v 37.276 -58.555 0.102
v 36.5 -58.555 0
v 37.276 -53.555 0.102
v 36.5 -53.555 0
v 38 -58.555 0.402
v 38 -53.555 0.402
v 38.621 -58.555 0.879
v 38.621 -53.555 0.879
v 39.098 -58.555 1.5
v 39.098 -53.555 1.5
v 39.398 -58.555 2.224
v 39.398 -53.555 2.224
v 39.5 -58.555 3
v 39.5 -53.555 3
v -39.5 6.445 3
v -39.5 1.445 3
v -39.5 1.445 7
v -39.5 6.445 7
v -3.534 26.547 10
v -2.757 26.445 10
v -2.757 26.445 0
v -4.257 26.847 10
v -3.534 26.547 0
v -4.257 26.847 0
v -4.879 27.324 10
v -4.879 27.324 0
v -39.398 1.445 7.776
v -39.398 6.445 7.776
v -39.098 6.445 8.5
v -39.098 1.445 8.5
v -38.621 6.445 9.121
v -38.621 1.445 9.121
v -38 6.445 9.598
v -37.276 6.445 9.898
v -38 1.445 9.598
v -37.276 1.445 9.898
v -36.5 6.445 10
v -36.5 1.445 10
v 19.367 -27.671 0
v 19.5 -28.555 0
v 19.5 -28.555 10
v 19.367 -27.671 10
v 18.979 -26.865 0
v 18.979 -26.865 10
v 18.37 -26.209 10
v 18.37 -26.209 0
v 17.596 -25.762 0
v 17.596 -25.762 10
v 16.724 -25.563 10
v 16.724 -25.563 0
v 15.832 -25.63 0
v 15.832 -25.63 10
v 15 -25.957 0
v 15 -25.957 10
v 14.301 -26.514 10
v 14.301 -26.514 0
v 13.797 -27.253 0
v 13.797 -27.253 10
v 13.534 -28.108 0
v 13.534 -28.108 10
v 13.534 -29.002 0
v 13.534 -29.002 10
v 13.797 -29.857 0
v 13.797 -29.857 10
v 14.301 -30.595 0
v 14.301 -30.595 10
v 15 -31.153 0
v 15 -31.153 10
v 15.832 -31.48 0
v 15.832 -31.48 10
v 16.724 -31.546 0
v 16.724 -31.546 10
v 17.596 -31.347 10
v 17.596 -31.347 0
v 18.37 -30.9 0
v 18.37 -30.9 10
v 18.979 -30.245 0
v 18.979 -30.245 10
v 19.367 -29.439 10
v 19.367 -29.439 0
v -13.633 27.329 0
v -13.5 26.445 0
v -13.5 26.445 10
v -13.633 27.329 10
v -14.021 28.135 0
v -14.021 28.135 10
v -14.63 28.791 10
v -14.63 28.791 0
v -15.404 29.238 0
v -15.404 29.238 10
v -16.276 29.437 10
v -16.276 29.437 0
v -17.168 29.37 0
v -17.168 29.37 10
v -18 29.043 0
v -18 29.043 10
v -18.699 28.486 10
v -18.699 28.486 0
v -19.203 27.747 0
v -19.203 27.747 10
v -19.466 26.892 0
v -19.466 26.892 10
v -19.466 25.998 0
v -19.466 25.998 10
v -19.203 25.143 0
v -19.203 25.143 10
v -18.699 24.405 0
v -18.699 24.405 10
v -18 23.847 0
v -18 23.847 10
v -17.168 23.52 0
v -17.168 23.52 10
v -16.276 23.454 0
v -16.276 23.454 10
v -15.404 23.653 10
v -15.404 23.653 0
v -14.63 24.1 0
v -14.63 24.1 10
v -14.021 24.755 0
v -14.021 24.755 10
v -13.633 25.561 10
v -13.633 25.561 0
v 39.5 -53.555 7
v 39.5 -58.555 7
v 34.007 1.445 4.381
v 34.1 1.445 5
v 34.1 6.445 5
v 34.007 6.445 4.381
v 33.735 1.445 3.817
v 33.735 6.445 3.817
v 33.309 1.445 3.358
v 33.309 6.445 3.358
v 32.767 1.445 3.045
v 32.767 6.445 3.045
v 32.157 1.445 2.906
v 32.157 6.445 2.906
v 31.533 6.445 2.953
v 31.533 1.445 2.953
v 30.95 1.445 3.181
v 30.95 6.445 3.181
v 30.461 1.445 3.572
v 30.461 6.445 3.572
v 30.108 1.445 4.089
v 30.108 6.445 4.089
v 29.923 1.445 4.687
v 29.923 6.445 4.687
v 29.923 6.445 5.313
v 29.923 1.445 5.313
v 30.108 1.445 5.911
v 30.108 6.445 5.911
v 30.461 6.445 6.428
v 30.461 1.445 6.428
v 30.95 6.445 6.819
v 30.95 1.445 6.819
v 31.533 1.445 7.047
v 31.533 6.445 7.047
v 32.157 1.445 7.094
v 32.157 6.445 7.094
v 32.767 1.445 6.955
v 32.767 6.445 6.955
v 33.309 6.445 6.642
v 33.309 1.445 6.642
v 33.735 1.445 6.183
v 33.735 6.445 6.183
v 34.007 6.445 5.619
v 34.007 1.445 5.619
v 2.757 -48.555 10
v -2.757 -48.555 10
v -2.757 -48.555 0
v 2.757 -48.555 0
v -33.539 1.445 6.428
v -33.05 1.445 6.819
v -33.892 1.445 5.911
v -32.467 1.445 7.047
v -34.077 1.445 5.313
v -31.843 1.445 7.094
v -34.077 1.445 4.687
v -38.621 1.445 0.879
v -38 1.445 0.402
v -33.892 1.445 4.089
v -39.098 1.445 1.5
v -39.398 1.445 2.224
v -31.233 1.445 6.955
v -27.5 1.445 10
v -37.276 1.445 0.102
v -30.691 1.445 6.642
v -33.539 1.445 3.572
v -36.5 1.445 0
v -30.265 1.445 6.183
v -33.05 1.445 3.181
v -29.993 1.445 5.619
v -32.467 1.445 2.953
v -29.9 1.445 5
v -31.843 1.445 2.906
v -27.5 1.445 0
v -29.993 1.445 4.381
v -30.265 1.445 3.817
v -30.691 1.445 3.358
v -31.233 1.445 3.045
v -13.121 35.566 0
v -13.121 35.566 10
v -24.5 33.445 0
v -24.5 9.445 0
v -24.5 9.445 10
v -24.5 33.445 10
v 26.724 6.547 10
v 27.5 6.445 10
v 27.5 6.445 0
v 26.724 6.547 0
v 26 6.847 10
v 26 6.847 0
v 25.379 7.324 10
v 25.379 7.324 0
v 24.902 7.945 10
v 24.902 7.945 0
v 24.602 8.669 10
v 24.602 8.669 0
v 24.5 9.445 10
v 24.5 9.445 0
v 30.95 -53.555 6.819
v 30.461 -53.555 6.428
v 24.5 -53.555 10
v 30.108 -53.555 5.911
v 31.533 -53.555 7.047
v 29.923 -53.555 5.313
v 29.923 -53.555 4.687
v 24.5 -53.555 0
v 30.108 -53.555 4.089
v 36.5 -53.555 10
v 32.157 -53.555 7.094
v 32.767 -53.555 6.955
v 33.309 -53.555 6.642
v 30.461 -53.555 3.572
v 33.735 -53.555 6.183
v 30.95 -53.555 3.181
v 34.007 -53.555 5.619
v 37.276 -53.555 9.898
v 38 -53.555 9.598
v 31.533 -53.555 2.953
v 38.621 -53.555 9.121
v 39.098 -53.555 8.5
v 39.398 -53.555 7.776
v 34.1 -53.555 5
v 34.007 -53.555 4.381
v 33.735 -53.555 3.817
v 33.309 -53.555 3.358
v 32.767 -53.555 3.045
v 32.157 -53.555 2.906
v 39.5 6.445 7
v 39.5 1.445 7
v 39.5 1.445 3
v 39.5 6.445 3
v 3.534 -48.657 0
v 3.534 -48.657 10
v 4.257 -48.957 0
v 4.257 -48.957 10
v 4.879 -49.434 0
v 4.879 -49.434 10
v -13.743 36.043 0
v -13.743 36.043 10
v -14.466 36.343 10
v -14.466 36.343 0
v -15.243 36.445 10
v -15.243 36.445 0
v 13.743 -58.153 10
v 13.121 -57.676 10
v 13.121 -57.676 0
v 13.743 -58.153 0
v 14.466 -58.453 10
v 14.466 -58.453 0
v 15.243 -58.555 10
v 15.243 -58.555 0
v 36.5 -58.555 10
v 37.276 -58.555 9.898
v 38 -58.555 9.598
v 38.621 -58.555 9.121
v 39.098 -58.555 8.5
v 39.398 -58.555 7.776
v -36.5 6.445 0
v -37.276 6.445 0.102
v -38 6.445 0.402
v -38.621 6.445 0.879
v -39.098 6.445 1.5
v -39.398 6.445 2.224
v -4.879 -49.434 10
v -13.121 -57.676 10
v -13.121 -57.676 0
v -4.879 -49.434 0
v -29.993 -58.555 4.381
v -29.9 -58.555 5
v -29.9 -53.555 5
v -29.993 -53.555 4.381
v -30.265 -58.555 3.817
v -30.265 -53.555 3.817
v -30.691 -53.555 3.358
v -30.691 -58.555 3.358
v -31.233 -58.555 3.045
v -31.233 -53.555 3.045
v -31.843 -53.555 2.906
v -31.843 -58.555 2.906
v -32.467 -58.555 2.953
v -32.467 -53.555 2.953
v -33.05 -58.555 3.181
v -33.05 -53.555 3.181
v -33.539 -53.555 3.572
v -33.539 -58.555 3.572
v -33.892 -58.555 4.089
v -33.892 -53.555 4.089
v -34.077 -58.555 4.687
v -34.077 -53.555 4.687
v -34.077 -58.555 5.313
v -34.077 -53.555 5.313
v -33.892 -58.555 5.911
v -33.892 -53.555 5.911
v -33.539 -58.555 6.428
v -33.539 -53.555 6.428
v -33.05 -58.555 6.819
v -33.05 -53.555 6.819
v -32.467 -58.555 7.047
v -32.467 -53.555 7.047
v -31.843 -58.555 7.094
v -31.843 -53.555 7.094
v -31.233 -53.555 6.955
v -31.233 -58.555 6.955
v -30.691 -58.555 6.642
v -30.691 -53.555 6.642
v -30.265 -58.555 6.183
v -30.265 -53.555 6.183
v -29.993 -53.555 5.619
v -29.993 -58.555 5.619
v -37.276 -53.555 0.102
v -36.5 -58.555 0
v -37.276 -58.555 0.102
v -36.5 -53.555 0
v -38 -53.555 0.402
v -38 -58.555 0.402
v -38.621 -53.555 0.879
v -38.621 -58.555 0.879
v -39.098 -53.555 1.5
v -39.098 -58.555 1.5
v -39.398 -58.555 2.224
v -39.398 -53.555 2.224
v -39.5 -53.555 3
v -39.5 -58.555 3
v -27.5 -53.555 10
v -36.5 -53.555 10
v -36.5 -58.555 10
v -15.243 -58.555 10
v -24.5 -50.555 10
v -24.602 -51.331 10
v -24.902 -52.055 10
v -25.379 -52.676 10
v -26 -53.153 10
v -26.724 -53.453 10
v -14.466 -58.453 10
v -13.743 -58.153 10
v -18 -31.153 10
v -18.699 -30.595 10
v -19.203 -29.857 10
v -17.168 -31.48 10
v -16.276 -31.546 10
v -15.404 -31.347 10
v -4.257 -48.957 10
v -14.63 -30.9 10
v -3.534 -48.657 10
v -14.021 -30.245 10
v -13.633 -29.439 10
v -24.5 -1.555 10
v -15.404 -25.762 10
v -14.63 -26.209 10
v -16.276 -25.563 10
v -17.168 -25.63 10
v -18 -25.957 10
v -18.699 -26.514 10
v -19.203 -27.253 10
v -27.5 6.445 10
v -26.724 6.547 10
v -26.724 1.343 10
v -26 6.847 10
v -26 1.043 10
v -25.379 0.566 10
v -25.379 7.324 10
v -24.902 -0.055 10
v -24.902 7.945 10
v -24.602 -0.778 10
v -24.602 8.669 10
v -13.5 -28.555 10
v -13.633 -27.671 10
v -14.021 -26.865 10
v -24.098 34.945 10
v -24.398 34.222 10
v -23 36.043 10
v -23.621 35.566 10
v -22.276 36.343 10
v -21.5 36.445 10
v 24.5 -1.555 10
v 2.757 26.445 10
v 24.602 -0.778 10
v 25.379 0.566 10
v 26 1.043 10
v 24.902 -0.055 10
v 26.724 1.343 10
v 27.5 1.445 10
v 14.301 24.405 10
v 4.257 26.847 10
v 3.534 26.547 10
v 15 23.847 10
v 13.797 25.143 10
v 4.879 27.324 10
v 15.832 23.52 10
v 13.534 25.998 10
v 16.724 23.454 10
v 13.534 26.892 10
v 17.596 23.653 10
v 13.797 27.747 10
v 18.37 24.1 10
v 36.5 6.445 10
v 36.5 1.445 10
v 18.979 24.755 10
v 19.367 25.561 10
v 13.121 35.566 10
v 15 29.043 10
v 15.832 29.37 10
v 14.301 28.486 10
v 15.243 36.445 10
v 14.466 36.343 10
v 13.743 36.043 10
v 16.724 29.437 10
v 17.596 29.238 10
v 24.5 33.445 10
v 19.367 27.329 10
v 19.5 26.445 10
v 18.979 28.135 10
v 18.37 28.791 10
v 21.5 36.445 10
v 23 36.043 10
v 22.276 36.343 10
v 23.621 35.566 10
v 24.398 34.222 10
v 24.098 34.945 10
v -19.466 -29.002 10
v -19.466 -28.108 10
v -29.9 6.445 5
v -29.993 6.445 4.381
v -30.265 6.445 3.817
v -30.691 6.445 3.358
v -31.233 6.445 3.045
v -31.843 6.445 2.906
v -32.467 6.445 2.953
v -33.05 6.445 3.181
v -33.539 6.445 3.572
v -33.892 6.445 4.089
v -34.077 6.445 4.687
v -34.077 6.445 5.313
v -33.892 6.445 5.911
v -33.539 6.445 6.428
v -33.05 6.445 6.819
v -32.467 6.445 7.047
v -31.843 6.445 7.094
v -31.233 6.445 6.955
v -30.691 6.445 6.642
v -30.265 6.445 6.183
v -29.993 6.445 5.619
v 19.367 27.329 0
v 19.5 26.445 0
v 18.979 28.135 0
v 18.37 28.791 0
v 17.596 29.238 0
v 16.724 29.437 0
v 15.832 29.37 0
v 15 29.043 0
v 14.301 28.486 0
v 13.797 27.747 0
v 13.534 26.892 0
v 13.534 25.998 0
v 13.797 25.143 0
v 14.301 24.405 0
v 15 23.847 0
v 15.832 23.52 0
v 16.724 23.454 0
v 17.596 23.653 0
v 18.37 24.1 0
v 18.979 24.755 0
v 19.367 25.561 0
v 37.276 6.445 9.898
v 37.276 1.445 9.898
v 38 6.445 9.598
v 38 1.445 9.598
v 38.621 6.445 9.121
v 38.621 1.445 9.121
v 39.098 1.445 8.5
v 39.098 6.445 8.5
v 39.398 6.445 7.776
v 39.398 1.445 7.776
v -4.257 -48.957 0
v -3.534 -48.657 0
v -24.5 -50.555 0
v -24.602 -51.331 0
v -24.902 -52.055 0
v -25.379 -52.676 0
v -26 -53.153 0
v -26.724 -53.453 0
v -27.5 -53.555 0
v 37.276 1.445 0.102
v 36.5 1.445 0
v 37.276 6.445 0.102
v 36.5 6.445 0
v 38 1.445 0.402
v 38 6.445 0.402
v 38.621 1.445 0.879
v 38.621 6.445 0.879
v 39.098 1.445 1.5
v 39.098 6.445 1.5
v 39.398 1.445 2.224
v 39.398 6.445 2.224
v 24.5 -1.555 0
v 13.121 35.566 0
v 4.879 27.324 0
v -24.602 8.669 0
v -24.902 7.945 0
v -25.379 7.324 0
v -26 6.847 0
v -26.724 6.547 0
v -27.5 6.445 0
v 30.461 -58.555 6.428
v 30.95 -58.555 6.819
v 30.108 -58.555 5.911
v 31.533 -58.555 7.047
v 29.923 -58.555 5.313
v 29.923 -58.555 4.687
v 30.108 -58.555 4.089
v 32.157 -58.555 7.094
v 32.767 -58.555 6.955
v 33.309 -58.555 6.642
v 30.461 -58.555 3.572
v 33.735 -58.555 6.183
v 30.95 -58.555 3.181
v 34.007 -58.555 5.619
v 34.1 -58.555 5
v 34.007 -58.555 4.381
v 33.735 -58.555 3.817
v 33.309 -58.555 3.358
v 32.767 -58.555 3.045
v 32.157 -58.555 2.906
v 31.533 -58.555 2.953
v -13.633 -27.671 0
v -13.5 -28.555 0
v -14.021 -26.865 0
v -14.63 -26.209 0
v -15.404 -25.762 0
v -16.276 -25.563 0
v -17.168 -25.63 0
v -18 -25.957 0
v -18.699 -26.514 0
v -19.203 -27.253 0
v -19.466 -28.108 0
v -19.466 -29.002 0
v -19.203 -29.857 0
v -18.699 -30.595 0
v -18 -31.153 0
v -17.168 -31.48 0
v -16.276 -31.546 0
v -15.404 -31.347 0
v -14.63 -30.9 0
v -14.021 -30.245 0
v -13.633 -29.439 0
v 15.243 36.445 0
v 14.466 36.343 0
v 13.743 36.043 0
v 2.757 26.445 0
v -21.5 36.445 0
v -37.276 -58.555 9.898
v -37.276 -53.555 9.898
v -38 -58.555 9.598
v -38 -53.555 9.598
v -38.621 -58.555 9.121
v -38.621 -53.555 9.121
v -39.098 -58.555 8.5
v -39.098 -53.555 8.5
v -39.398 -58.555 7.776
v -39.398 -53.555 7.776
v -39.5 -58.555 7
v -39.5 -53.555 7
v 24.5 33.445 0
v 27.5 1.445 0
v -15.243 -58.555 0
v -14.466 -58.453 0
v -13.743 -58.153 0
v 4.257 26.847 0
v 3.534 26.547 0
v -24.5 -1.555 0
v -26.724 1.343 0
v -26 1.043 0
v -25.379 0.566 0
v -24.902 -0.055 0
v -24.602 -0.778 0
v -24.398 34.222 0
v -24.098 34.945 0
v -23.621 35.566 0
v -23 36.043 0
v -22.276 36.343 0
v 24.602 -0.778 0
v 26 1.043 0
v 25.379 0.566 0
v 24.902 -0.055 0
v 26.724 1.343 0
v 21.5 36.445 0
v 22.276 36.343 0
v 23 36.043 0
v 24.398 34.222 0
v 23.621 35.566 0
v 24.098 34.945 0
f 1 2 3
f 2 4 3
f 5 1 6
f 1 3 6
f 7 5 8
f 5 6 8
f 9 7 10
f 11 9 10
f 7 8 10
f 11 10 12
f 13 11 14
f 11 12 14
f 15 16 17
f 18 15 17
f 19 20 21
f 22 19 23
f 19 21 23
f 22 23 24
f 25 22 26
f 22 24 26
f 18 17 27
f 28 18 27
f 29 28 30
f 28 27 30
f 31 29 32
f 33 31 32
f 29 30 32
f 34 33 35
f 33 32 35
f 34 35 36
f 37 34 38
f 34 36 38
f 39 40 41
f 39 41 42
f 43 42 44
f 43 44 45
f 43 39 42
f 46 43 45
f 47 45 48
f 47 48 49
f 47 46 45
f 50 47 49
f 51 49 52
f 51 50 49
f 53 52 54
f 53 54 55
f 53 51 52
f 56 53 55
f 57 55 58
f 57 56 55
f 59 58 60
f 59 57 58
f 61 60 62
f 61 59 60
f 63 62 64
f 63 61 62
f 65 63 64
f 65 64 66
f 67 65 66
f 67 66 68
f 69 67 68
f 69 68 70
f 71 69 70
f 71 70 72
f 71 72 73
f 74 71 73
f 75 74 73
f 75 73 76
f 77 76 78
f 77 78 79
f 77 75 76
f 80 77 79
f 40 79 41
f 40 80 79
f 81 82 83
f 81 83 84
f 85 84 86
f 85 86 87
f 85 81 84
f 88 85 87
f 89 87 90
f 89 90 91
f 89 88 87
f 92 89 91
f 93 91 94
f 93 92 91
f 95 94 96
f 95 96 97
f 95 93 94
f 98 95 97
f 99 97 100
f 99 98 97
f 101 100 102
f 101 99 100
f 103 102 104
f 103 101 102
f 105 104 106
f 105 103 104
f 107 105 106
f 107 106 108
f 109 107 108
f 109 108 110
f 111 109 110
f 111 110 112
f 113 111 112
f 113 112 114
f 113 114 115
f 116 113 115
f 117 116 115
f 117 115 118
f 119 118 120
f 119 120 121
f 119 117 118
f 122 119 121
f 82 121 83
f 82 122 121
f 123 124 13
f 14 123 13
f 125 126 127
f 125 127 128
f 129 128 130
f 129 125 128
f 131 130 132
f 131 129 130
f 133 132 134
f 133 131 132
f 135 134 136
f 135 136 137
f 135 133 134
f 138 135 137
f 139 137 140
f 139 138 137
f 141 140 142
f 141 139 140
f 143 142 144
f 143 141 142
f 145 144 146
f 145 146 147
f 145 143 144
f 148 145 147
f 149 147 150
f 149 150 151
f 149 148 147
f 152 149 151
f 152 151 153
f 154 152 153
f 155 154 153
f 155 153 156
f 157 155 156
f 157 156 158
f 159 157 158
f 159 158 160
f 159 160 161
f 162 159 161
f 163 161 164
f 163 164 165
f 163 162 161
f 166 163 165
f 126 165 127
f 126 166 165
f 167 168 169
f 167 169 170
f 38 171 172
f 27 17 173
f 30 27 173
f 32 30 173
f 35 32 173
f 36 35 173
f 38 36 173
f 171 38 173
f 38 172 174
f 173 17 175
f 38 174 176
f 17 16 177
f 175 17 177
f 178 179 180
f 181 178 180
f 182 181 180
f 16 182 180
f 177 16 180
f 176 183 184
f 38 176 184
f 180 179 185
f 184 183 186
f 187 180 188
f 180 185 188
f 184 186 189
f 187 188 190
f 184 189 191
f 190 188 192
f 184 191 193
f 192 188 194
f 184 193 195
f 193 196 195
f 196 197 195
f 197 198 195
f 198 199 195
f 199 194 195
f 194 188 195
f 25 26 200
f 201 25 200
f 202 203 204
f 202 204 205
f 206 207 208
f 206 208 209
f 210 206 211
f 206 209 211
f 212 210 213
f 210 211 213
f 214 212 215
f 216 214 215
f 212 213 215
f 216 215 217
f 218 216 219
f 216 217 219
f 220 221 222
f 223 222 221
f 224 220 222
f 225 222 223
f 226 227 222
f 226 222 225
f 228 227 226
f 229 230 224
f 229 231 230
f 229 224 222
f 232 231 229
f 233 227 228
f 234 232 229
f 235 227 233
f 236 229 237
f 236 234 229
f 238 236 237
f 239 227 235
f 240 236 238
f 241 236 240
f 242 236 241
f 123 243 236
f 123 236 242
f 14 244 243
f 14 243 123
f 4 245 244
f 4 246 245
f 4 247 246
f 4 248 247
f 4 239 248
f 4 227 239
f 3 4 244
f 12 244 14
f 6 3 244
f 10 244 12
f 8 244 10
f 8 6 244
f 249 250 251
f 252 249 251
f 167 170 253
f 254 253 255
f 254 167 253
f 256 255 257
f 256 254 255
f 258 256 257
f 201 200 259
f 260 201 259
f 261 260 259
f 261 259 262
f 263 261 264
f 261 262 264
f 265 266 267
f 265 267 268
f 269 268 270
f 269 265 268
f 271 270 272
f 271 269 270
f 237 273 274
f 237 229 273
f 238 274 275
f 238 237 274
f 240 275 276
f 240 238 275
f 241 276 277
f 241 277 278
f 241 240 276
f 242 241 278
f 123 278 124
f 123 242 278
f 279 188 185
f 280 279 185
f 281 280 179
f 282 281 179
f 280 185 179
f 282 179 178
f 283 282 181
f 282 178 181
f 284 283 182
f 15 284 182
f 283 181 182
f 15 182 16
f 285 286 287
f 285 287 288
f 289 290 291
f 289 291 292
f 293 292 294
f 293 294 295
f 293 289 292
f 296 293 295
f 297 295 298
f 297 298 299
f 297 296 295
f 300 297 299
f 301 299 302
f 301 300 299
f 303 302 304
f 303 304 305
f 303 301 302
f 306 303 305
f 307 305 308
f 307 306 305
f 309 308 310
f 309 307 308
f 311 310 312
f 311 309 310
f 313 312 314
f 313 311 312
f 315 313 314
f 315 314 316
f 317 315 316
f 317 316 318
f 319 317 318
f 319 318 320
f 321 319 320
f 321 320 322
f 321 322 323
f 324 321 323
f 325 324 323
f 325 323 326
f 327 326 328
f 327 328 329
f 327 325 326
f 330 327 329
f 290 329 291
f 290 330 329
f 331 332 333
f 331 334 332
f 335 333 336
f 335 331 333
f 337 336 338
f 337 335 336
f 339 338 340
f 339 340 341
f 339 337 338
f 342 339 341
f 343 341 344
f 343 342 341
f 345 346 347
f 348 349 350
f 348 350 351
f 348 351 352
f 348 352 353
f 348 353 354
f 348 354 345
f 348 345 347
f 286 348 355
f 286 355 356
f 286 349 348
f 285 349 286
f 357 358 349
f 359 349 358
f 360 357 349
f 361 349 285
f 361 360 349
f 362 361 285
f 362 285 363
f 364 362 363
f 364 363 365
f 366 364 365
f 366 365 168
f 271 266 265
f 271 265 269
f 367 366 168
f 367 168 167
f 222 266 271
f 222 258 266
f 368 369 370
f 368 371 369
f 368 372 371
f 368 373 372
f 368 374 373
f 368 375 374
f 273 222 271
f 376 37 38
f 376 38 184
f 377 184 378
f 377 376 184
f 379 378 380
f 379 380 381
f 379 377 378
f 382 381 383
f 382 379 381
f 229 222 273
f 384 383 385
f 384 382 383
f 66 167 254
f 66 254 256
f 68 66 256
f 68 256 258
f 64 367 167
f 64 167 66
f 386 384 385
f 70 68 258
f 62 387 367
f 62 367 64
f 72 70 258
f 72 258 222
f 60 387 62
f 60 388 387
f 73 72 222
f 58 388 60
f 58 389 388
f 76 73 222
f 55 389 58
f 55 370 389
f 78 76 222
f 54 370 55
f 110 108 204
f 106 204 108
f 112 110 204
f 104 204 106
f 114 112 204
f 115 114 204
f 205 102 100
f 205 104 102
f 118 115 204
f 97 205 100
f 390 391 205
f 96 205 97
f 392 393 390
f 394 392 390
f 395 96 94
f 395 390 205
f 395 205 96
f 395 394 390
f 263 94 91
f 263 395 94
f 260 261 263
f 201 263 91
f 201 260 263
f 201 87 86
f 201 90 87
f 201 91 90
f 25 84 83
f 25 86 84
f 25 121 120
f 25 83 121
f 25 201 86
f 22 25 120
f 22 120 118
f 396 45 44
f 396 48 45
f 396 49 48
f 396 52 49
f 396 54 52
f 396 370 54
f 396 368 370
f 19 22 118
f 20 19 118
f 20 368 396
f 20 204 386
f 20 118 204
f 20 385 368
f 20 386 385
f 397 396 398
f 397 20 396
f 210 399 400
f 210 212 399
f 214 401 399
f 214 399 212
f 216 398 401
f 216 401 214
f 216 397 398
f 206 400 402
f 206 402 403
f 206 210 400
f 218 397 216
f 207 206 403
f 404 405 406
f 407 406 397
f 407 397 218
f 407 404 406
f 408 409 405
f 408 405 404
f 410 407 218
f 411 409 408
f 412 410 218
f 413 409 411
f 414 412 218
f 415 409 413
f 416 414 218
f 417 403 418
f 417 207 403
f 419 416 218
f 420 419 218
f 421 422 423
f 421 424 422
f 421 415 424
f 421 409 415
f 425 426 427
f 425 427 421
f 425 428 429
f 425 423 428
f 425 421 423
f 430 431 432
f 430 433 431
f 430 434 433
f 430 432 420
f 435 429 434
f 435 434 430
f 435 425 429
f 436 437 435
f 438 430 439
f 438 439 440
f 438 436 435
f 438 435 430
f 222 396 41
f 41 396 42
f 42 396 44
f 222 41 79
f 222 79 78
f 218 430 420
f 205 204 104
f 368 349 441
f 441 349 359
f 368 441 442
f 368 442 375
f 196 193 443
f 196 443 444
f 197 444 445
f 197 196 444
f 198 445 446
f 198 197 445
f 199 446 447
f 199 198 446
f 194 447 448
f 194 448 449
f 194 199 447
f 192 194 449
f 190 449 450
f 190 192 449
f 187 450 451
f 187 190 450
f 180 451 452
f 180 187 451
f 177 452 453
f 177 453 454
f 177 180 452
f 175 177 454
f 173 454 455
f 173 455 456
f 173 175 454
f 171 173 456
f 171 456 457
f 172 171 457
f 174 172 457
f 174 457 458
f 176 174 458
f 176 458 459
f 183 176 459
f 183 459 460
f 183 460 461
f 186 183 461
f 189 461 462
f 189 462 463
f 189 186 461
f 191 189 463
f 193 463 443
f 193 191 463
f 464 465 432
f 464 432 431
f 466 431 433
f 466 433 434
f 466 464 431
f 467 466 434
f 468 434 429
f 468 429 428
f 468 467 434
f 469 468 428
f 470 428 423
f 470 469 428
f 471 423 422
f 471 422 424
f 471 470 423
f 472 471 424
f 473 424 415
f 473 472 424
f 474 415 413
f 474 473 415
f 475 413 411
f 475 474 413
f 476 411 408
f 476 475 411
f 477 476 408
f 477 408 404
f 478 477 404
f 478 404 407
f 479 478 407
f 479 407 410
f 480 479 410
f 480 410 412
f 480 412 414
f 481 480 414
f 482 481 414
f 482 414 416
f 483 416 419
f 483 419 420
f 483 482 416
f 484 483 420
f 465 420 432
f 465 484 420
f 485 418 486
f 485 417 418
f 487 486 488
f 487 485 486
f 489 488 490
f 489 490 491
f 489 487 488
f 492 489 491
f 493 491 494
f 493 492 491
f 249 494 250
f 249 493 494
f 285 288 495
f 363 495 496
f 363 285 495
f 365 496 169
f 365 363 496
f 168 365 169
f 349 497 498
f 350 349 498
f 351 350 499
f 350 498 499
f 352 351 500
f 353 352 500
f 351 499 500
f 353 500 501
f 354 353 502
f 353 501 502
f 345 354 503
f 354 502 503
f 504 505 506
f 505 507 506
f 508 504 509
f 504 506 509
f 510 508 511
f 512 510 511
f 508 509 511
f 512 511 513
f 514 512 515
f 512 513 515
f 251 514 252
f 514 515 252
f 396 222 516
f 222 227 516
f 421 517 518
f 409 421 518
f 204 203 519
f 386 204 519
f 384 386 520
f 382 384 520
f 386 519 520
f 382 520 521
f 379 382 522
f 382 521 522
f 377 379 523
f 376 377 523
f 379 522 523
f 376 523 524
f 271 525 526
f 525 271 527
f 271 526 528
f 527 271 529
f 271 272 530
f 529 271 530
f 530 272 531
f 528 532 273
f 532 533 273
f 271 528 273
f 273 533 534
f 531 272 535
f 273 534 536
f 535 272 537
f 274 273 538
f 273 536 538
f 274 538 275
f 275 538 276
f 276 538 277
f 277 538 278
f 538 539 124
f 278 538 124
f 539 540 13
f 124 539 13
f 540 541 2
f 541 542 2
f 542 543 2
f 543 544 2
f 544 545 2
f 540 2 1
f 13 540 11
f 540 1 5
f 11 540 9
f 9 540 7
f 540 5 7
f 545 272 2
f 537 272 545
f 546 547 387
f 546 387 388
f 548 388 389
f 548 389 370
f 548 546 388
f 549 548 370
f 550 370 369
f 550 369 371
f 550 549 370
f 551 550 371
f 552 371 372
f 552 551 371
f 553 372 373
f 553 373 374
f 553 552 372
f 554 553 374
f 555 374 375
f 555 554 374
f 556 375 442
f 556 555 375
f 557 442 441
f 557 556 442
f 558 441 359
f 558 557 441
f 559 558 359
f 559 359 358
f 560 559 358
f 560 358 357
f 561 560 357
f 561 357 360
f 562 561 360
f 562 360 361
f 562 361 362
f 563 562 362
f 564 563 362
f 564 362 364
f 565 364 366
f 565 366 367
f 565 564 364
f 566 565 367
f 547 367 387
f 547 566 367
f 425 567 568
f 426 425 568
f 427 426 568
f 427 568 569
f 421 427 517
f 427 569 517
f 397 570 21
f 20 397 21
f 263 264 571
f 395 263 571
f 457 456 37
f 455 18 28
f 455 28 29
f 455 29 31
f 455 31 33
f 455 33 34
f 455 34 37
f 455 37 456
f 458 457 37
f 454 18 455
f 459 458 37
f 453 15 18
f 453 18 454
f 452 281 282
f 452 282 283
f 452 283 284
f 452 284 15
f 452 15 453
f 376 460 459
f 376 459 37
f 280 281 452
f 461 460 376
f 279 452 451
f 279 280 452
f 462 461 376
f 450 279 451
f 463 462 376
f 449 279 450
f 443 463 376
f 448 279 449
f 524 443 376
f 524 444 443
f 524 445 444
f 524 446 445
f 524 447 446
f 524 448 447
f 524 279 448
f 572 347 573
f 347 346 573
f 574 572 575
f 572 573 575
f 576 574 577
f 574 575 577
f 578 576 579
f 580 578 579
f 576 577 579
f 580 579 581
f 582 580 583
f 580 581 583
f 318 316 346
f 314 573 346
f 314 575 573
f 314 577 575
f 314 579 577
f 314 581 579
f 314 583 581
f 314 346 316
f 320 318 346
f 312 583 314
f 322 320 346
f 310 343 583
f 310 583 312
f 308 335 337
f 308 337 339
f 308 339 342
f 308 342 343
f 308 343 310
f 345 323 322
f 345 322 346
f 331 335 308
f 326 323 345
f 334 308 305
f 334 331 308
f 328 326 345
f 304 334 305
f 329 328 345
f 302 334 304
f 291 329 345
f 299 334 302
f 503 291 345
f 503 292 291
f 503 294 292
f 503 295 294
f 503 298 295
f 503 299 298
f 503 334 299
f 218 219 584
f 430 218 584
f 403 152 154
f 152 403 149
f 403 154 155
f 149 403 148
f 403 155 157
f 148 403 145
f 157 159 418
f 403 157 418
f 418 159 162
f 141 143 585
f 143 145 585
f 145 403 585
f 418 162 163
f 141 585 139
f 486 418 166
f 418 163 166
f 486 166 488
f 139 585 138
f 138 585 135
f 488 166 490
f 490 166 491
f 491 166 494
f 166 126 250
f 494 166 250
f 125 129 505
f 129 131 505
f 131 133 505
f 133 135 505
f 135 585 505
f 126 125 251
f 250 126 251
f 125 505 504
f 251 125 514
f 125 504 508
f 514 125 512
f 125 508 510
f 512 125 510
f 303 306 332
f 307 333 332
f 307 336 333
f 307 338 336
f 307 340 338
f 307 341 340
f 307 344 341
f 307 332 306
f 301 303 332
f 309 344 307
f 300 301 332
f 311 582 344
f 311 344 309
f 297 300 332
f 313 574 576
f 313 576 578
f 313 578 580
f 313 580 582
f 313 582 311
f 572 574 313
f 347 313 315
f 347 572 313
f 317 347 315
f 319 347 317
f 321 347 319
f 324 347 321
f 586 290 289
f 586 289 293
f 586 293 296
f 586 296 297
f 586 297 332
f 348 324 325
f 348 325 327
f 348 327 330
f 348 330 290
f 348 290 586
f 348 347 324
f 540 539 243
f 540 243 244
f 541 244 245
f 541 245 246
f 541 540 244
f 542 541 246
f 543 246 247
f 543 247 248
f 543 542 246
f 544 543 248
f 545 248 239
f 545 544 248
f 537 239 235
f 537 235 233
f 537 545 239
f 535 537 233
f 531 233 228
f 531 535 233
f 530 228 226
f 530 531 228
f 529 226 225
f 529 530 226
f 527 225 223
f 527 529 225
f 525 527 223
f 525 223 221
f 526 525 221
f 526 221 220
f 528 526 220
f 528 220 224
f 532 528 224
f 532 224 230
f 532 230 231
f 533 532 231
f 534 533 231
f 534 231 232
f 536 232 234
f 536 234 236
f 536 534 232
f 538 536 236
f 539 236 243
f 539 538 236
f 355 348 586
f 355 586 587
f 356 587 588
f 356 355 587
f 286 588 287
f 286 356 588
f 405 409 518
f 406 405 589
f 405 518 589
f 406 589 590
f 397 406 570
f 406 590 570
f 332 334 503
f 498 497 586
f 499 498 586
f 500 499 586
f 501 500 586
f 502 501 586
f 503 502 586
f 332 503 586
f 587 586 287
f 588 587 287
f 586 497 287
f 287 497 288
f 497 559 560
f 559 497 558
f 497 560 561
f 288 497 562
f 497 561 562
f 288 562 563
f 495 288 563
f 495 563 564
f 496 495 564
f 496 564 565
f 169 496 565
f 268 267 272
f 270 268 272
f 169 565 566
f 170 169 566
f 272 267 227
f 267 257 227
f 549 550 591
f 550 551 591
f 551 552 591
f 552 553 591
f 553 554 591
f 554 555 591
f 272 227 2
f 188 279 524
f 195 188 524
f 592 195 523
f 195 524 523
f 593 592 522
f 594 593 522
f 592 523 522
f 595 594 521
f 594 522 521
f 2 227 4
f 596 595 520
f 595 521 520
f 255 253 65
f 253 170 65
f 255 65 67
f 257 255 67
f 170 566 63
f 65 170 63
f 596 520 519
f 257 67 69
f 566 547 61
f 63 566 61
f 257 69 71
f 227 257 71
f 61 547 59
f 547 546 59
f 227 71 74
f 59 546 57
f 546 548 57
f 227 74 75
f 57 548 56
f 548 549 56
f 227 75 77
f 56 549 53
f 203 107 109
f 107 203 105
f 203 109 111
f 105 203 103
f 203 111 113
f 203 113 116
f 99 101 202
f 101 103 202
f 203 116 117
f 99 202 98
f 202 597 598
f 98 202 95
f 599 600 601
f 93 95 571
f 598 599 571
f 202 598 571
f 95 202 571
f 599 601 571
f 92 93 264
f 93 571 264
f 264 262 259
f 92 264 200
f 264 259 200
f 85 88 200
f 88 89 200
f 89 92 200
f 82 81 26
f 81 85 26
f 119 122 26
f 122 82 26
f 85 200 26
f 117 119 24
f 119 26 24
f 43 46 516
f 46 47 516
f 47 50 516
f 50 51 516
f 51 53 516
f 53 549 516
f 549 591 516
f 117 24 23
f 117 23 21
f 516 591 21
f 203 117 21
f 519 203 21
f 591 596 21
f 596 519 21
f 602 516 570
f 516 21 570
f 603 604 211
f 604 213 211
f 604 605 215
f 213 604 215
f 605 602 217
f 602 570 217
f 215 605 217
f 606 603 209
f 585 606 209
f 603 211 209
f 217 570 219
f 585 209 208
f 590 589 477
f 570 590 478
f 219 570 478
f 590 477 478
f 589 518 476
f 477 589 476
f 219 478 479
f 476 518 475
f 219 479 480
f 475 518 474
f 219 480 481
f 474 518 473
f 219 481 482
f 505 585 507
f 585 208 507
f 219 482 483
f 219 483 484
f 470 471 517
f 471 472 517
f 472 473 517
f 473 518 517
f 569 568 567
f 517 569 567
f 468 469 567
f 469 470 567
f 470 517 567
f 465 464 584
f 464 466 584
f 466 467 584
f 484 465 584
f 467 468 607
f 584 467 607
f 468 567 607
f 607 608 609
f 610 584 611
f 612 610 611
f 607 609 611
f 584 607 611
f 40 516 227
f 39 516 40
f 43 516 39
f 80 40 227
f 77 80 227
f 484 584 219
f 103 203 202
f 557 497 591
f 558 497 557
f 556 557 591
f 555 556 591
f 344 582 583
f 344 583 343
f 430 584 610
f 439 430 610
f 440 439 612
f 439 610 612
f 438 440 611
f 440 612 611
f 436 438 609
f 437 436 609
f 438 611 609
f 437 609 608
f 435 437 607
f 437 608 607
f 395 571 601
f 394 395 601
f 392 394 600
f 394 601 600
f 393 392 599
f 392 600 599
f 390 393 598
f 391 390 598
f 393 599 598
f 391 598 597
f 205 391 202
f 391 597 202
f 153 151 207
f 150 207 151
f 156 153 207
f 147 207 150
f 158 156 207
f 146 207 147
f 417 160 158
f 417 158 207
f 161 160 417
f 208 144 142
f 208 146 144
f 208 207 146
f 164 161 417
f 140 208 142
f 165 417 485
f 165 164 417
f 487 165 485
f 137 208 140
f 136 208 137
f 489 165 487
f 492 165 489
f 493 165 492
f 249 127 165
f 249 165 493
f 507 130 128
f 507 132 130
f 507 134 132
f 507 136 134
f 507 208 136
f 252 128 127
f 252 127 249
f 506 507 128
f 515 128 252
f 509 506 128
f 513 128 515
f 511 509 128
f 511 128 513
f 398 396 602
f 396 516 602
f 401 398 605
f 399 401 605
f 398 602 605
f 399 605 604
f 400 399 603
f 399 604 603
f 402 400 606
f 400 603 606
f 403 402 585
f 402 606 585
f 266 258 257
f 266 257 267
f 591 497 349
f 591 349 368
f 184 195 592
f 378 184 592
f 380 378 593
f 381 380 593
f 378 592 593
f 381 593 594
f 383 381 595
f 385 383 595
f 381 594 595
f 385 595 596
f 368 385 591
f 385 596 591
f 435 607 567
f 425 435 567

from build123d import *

# Parameters (mm, degrees)
SKETCH1_R           = 3
BOSS_EXTRUDE1_DEPTH = 10
SKETCH2_W           = 10
SKETCH2_H           = 5
BOSS_EXTRUDE2_DEPTH = 15
SKETCH3_R           = 2.1
CUT_EXTRUDE1_DEPTH  = 64
FILLET1_R           = 3
BOSS_EXTRUDE3_START = -10
BOSS_EXTRUDE3_DEPTH = 10
MIRROR3_START       = -58.554872108
MIRROR3_OUTLINE_W   = 15
MIRROR3_OUTLINE_H   = 10
MIRROR3_OUTLINE_R   = 2.1
MIRROR3_DEPTH       = 5
MIRROR3_2_DEPTH     = 10
FILLET2_R           = 3
SKETCH5_W           = 15
SKETCH5_H           = 11
CUT_EXTRUDE2_DEPTH  = 80.749736613
FILLET3_R           = 3
MIRROR4_START       = 1.445127892
MIRROR4_OUTLINE_R   = 2.1
MIRROR4_DEPTH       = 5
MIRROR4_2_DEPTH     = 10
FILLET4_R           = 3
SKETCH6_W           = 15
SKETCH6_H           = 11
CUT_EXTRUDE3_DEPTH  = 80.749736613
CUT_EXTRUDE4_DEPTH  = 80.749736613


with BuildPart() as part:
    # Sketch1 → Boss-Extrude1 (new body)
    with BuildSketch(Plane.XY):
        with BuildLine():
            Line((-24.5, 33.445127892), (-24.5, -35.554872108))
            ThreePointArc((-24.5, -35.554872108), (-23.621320344, -37.676192452), (-21.5, -38.554872108))
            Line((-21.5, -38.554872108), (-15.242640687, -38.554872108))
            ThreePointArc((-15.242640687, -38.554872108), (-14.09459039, -38.326510706), (-13.121320344, -37.676192452))
            Line((-13.121320344, -37.676192452), (-4.878679656, -29.433551765))
            ThreePointArc((-4.878679656, -29.433551765), (-3.90540961, -28.783233511), (-2.757359313, -28.554872108))
            Line((-2.757359313, -28.554872108), (2.757359313, -28.554872108))
            ThreePointArc((2.757359313, -28.554872108), (3.90540961, -28.783233511), (4.878679656, -29.433551765))
            Line((4.878679656, -29.433551765), (13.121320344, -37.676192452))
            ThreePointArc((13.121320344, -37.676192452), (14.09459039, -38.326510706), (15.242640687, -38.554872108))
            Line((15.242640687, -38.554872108), (21.5, -38.554872108))
            ThreePointArc((21.5, -38.554872108), (23.621320344, -37.676192452), (24.5, -35.554872108))
            Line((24.5, -35.554872108), (24.5, 33.445127892))
            ThreePointArc((24.5, 33.445127892), (23.621320344, 35.566448235), (21.5, 36.445127892))
            Line((21.5, 36.445127892), (15.242640687, 36.445127892))
            ThreePointArc((15.242640687, 36.445127892), (14.09459039, 36.216766489), (13.121320344, 35.566448235))
            Line((13.121320344, 35.566448235), (4.878679656, 27.323807548))
            ThreePointArc((4.878679656, 27.323807548), (3.90540961, 26.673489294), (2.757359313, 26.445127892))
            Line((2.757359313, 26.445127892), (-2.757359313, 26.445127892))
            ThreePointArc((-2.757359313, 26.445127892), (-3.90540961, 26.673489294), (-4.878679656, 27.323807548))
            Line((-4.878679656, 27.323807548), (-13.121320344, 35.566448235))
            ThreePointArc((-13.121320344, 35.566448235), (-14.09459039, 36.216766489), (-15.242640687, 36.445127892))
            Line((-15.242640687, 36.445127892), (-21.5, 36.445127892))
            ThreePointArc((-21.5, 36.445127892), (-23.621320344, 35.566448235), (-24.5, 33.445127892))
        make_face()
        with Locations((16.5, -28.554872108)):
            Circle(SKETCH1_R, mode=Mode.SUBTRACT)
        with Locations((-16.5, -28.554872108)):
            Circle(SKETCH1_R, mode=Mode.SUBTRACT)
        with Locations((16.5, 26.445127892)):
            Circle(SKETCH1_R, mode=Mode.SUBTRACT)
        with Locations((-16.5, 26.445127892)):
            Circle(SKETCH1_R, mode=Mode.SUBTRACT)
    extrude(amount=BOSS_EXTRUDE1_DEPTH)

    # Sketch2 → Boss-Extrude2 (add)
    with BuildSketch(Plane(origin=(24.5, 0, 0), x_dir=(0, 0, -1), z_dir=(1, 0, 0))):
        with Locations((-5, 23.945127892)):
            Rectangle(SKETCH2_W, SKETCH2_H)
        with Locations((-5, -26.054872108)):
            Rectangle(SKETCH2_W, SKETCH2_H)
    boss_extrude2 = extrude(amount=BOSS_EXTRUDE2_DEPTH)

    # Sketch3 → Cut-Extrude1 (cut)
    with BuildSketch(Plane(origin=(0, 26.445127892, 0), x_dir=(1, 0, 0), z_dir=(0, 1, 0))):
        with Locations(Location((32, -5, 0), (0, 0, 180))):
            Circle(SKETCH3_R)
    cut_extrude1 = extrude(amount=-CUT_EXTRUDE1_DEPTH, mode=Mode.SUBTRACT)

    # Mirror1: Boss-Extrude2, Cut-Extrude1 across plane
    add(boss_extrude2.mirror(Plane(origin=(0, 0, 0), x_dir=(0, 0, 1), z_dir=(1, 0, 0))))
    add(cut_extrude1.mirror(Plane(origin=(0, 0, 0), x_dir=(0, 0, 1), z_dir=(1, 0, 0))), mode=Mode.SUBTRACT)

    # Fillet1
    fillet1_edges = [part.edges().sort_by_distance(p)[0] for p in [
        (-39.5, 23.945127892, 10),
        (-39.5, 23.945127892, 0),
        (-24.5, 21.445127892, 5),
        (-24.5, 26.445127892, 5),
        (-39.5, -26.054872108, 10),
        (-39.5, -26.054872108, 0),
        (-24.5, -28.554872108, 5),
        (-24.5, -23.554872108, 5),
        (24.5, 21.445127892, 5),
        (24.5, 26.445127892, 5),
        (39.5, 23.945127892, 10),
        (39.5, 23.945127892, 0),
        (24.5, -28.554872108, 5),
        (24.5, -23.554872108, 5),
        (39.5, -26.054872108, 10),
        (39.5, -26.054872108, 0),
    ]]
    fillet(fillet1_edges, radius=FILLET1_R)

    # Sketch4 → Boss-Extrude3 (add)
    with BuildSketch(Plane.XY.offset(10).offset(BOSS_EXTRUDE3_START)):
        with BuildLine():
            ThreePointArc((15.242640687, -68.554872108), (14.09459039, -68.326510706), (13.121320344, -67.676192452))
            Line((13.121320344, -67.676192452), (4.878679656, -59.433551765))
            ThreePointArc((4.878679656, -59.433551765), (3.90540961, -58.783233511), (2.757359313, -58.554872108))
            Line((2.757359313, -58.554872108), (-2.757359313, -58.554872108))
            ThreePointArc((-2.757359313, -58.554872108), (-3.90540961, -58.783233511), (-4.878679656, -59.433551765))
            Line((-4.878679656, -59.433551765), (-13.121320344, -67.676192452))
            ThreePointArc((-13.121320344, -67.676192452), (-14.09459039, -68.326510706), (-15.242640687, -68.554872108))
            Line((-15.242640687, -68.554872108), (-24.5, -68.554872108))
            Line((-24.5, -68.554872108), (-24.5, -38.554872108))
            Line((-24.5, -38.554872108), (-24.5, -35.554872108))
            ThreePointArc((-24.5, -35.554872108), (-23.621320344, -37.676192452), (-21.5, -38.554872108))
            Line((-21.5, -38.554872108), (-15.242640687, -38.554872108))
            ThreePointArc((-15.242640687, -38.554872108), (-14.09459039, -38.326510706), (-13.121320344, -37.676192452))
            Line((-13.121320344, -37.676192452), (-4.878679656, -29.433551765))
            ThreePointArc((-4.878679656, -29.433551765), (-3.90540961, -28.783233511), (-2.757359313, -28.554872108))
            Line((-2.757359313, -28.554872108), (2.757359313, -28.554872108))
            ThreePointArc((2.757359313, -28.554872108), (3.90540961, -28.783233511), (4.878679656, -29.433551765))
            Line((4.878679656, -29.433551765), (13.121320344, -37.676192452))
            ThreePointArc((13.121320344, -37.676192452), (14.09459039, -38.326510706), (15.242640687, -38.554872108))
            Line((15.242640687, -38.554872108), (21.5, -38.554872108))
            ThreePointArc((21.5, -38.554872108), (23.621320344, -37.676192452), (24.5, -35.554872108))
            Line((24.5, -35.554872108), (24.5, -38.554872108))
            Line((24.5, -38.554872108), (24.5, -68.554872108))
            Line((24.5, -68.554872108), (15.242640687, -68.554872108))
        make_face()
    extrude(amount=BOSS_EXTRUDE3_DEPTH)

    # Mirror3: read off the stored shape, not the designer's step
    # Mirror3 outline → Mirror3 (add)
    # profile 1 of 2: a face of its own
    with BuildSketch(Plane(origin=(0, 0, 0), x_dir=(1, 0, 0), z_dir=(0, 1, 0)).offset(MIRROR3_START)):
        with Locations((32, -5)):
            Rectangle(MIRROR3_OUTLINE_W, MIRROR3_OUTLINE_H)
        with Locations((32, -5)):
            Circle(MIRROR3_OUTLINE_R, mode=Mode.SUBTRACT)
    # profile 2 of 2: a face of its own
    with BuildSketch(Plane(origin=(0, 0, 0), x_dir=(1, 0, 0), z_dir=(0, 1, 0)).offset(MIRROR3_START)):
        with Locations((-32, -5)):
            Rectangle(MIRROR3_OUTLINE_W, MIRROR3_OUTLINE_H)
        with Locations((-32, -5)):
            Circle(MIRROR3_OUTLINE_R, mode=Mode.SUBTRACT)
    extrude(amount=MIRROR3_DEPTH)

    # Mirror3 2 outline → Mirror3 2 (add)
    with BuildSketch(Plane.XY):
        with BuildLine():
            ThreePointArc((-24.5, -50.554872108), (-25.378679656, -52.676192452), (-27.5, -53.554872108))
            Line((-27.5, -53.554872108), (-24.5, -53.554872108))
            Line((-24.5, -53.554872108), (-24.5, -50.554872108))
        make_face()
        with BuildLine():
            Line((-24.5, -58.554872108), (-27.5, -58.554872108))
            ThreePointArc((-27.5, -58.554872108), (-25.378679657, -59.433551764), (-24.5, -61.554872108))
            Line((-24.5, -61.554872108), (-24.5, -58.554872108))
        make_face()
    extrude(amount=MIRROR3_2_DEPTH)

    # Fillet2
    fillet2_edges = [part.edges().sort_by_distance(p)[0] for p in [
        (-39.5, -56.054872108, 10),
        (-39.5, -56.054872108, 0),
        (39.5, -56.054872108, 10),
        (39.5, -56.054872108, 0),
    ]]
    fillet(fillet2_edges, radius=FILLET2_R)

    # Sketch5 → Cut-Extrude2 (cut, through all)
    with BuildSketch(Plane.XY.offset(10)):
        with Locations((-32, -26.054872108)):
            Rectangle(SKETCH5_W, SKETCH5_H)
        with Locations((32, -26.054872108)):
            Rectangle(SKETCH5_W, SKETCH5_H)
    extrude(amount=-CUT_EXTRUDE2_DEPTH, mode=Mode.SUBTRACT)

    # Fillet3
    fillet3_edges = [part.edges().sort_by_distance(p)[0] for p in [
        (-24.5, -68.554872108, 5),
        (24.5, -68.554872108, 5),
    ]]
    fillet(fillet3_edges, radius=FILLET3_R)

    # Mirror4: read off the stored shape, not the designer's step
    # Mirror4 outline → Mirror4 (add)
    with BuildSketch(Plane(origin=(0, 0, 0), x_dir=(1, 0, 0), z_dir=(0, 1, 0)).offset(MIRROR4_START)):
        with BuildLine():
            ThreePointArc((-39.5, -7), (-38.621320344, -9.121320344), (-36.5, -10))
            Line((-36.5, -10), (39.5, -10))
            Line((39.5, -10), (39.5, 0))
            Line((39.5, 0), (-36.5, 0))
            ThreePointArc((-36.5, 0), (-38.621320344, -0.878679656), (-39.5, -3))
            Line((-39.5, -3), (-39.5, -7))
        make_face()
        with Locations((-32, -5)):
            Circle(MIRROR4_OUTLINE_R, mode=Mode.SUBTRACT)
        with Locations((32, -5)):
            Circle(MIRROR4_OUTLINE_R, mode=Mode.SUBTRACT)
    extrude(amount=MIRROR4_DEPTH)

    # Mirror4 2 outline → Mirror4 2 (add)
    with BuildSketch(Plane.XY):
        with BuildLine():
            ThreePointArc((-24.5, 9.445127892), (-25.378679656, 7.323807548), (-27.5, 6.445127892))
            Line((-27.5, 6.445127892), (-24.5, 6.445127892))
            Line((-24.5, 6.445127892), (-24.5, 9.445127892))
        make_face()
        with BuildLine():
            Line((-24.5, 1.445127892), (-27.5, 1.445127892))
            ThreePointArc((-27.5, 1.445127892), (-25.378679657, 0.566448236), (-24.5, -1.554872108))
            Line((-24.5, -1.554872108), (-24.5, 1.445127892))
        make_face()
    extrude(amount=MIRROR4_2_DEPTH)

    # Fillet4
    fillet4_edges = [part.edges().sort_by_distance(p)[0] for p in [
        (39.5, 3.945127892, 10),
        (39.5, 3.945127892, 0),
        (24.5, 6.445127892, 5),
        (24.5, 1.445127892, 5),
    ]]
    fillet(fillet4_edges, radius=FILLET4_R)

    # Sketch6 → Cut-Extrude3 (cut, through all)
    with BuildSketch(Plane.XY.offset(10)):
        with Locations((-32, 23.945127892)):
            Rectangle(SKETCH6_W, SKETCH6_H)
        with Locations((32, 23.945127892)):
            Rectangle(SKETCH6_W, SKETCH6_H)
    extrude(amount=-CUT_EXTRUDE3_DEPTH, mode=Mode.SUBTRACT)

    # Sketch7 → Cut-Extrude4 (cut, through all)
    with BuildSketch(Plane.XY.offset(10)):
        with BuildLine():
            Line((15.242640687, -58.554872108), (24.5, -58.554872108))
            Line((24.5, -58.554872108), (24.5, -65.554872108))
            ThreePointArc((24.5, -65.554872108), (23.621320344, -67.676192452), (21.5, -68.554872108))
            Line((21.5, -68.554872108), (15.242640687, -68.554872108))
            ThreePointArc((15.242640687, -68.554872108), (14.09459039, -68.326510706), (13.121320344, -67.676192452))
            Line((13.121320344, -67.676192452), (4.878679656, -59.433551765))
            ThreePointArc((4.878679656, -59.433551765), (3.90540961, -58.783233511), (2.757359313, -58.554872108))
            Line((2.757359313, -58.554872108), (-2.757359313, -58.554872108))
            ThreePointArc((-2.757359313, -58.554872108), (-3.90540961, -58.783233511), (-4.878679656, -59.433551765))
            Line((-4.878679656, -59.433551765), (-13.121320344, -67.676192452))
            ThreePointArc((-13.121320344, -67.676192452), (-14.09459039, -68.326510706), (-15.242640687, -68.554872108))
            Line((-15.242640687, -68.554872108), (-21.5, -68.554872108))
            ThreePointArc((-21.5, -68.554872108), (-23.621320344, -67.676192452), (-24.5, -65.554872108))
            Line((-24.5, -65.554872108), (-24.5, -61.554872108))
            ThreePointArc((-24.5, -61.554872108), (-25.378679656, -59.433551765), (-27.5, -58.554872108))
            Line((-27.5, -58.554872108), (-15.242640687, -58.554872108))
            ThreePointArc((-15.242640687, -58.554872108), (-14.09459039, -58.326510706), (-13.121320344, -57.676192452))
            Line((-13.121320344, -57.676192452), (-4.878679656, -49.433551765))
            ThreePointArc((-4.878679656, -49.433551765), (-3.90540961, -48.783233511), (-2.757359313, -48.554872108))
            Line((-2.757359313, -48.554872108), (2.757359313, -48.554872108))
            ThreePointArc((2.757359313, -48.554872108), (3.90540961, -48.783233511), (4.878679656, -49.433551765))
            Line((4.878679656, -49.433551765), (13.121320344, -57.676192452))
            ThreePointArc((13.121320344, -57.676192452), (14.09459039, -58.326510706), (15.242640687, -58.554872108))
        make_face()
    extrude(amount=-CUT_EXTRUDE4_DEPTH, mode=Mode.SUBTRACT)


solid = part.part
